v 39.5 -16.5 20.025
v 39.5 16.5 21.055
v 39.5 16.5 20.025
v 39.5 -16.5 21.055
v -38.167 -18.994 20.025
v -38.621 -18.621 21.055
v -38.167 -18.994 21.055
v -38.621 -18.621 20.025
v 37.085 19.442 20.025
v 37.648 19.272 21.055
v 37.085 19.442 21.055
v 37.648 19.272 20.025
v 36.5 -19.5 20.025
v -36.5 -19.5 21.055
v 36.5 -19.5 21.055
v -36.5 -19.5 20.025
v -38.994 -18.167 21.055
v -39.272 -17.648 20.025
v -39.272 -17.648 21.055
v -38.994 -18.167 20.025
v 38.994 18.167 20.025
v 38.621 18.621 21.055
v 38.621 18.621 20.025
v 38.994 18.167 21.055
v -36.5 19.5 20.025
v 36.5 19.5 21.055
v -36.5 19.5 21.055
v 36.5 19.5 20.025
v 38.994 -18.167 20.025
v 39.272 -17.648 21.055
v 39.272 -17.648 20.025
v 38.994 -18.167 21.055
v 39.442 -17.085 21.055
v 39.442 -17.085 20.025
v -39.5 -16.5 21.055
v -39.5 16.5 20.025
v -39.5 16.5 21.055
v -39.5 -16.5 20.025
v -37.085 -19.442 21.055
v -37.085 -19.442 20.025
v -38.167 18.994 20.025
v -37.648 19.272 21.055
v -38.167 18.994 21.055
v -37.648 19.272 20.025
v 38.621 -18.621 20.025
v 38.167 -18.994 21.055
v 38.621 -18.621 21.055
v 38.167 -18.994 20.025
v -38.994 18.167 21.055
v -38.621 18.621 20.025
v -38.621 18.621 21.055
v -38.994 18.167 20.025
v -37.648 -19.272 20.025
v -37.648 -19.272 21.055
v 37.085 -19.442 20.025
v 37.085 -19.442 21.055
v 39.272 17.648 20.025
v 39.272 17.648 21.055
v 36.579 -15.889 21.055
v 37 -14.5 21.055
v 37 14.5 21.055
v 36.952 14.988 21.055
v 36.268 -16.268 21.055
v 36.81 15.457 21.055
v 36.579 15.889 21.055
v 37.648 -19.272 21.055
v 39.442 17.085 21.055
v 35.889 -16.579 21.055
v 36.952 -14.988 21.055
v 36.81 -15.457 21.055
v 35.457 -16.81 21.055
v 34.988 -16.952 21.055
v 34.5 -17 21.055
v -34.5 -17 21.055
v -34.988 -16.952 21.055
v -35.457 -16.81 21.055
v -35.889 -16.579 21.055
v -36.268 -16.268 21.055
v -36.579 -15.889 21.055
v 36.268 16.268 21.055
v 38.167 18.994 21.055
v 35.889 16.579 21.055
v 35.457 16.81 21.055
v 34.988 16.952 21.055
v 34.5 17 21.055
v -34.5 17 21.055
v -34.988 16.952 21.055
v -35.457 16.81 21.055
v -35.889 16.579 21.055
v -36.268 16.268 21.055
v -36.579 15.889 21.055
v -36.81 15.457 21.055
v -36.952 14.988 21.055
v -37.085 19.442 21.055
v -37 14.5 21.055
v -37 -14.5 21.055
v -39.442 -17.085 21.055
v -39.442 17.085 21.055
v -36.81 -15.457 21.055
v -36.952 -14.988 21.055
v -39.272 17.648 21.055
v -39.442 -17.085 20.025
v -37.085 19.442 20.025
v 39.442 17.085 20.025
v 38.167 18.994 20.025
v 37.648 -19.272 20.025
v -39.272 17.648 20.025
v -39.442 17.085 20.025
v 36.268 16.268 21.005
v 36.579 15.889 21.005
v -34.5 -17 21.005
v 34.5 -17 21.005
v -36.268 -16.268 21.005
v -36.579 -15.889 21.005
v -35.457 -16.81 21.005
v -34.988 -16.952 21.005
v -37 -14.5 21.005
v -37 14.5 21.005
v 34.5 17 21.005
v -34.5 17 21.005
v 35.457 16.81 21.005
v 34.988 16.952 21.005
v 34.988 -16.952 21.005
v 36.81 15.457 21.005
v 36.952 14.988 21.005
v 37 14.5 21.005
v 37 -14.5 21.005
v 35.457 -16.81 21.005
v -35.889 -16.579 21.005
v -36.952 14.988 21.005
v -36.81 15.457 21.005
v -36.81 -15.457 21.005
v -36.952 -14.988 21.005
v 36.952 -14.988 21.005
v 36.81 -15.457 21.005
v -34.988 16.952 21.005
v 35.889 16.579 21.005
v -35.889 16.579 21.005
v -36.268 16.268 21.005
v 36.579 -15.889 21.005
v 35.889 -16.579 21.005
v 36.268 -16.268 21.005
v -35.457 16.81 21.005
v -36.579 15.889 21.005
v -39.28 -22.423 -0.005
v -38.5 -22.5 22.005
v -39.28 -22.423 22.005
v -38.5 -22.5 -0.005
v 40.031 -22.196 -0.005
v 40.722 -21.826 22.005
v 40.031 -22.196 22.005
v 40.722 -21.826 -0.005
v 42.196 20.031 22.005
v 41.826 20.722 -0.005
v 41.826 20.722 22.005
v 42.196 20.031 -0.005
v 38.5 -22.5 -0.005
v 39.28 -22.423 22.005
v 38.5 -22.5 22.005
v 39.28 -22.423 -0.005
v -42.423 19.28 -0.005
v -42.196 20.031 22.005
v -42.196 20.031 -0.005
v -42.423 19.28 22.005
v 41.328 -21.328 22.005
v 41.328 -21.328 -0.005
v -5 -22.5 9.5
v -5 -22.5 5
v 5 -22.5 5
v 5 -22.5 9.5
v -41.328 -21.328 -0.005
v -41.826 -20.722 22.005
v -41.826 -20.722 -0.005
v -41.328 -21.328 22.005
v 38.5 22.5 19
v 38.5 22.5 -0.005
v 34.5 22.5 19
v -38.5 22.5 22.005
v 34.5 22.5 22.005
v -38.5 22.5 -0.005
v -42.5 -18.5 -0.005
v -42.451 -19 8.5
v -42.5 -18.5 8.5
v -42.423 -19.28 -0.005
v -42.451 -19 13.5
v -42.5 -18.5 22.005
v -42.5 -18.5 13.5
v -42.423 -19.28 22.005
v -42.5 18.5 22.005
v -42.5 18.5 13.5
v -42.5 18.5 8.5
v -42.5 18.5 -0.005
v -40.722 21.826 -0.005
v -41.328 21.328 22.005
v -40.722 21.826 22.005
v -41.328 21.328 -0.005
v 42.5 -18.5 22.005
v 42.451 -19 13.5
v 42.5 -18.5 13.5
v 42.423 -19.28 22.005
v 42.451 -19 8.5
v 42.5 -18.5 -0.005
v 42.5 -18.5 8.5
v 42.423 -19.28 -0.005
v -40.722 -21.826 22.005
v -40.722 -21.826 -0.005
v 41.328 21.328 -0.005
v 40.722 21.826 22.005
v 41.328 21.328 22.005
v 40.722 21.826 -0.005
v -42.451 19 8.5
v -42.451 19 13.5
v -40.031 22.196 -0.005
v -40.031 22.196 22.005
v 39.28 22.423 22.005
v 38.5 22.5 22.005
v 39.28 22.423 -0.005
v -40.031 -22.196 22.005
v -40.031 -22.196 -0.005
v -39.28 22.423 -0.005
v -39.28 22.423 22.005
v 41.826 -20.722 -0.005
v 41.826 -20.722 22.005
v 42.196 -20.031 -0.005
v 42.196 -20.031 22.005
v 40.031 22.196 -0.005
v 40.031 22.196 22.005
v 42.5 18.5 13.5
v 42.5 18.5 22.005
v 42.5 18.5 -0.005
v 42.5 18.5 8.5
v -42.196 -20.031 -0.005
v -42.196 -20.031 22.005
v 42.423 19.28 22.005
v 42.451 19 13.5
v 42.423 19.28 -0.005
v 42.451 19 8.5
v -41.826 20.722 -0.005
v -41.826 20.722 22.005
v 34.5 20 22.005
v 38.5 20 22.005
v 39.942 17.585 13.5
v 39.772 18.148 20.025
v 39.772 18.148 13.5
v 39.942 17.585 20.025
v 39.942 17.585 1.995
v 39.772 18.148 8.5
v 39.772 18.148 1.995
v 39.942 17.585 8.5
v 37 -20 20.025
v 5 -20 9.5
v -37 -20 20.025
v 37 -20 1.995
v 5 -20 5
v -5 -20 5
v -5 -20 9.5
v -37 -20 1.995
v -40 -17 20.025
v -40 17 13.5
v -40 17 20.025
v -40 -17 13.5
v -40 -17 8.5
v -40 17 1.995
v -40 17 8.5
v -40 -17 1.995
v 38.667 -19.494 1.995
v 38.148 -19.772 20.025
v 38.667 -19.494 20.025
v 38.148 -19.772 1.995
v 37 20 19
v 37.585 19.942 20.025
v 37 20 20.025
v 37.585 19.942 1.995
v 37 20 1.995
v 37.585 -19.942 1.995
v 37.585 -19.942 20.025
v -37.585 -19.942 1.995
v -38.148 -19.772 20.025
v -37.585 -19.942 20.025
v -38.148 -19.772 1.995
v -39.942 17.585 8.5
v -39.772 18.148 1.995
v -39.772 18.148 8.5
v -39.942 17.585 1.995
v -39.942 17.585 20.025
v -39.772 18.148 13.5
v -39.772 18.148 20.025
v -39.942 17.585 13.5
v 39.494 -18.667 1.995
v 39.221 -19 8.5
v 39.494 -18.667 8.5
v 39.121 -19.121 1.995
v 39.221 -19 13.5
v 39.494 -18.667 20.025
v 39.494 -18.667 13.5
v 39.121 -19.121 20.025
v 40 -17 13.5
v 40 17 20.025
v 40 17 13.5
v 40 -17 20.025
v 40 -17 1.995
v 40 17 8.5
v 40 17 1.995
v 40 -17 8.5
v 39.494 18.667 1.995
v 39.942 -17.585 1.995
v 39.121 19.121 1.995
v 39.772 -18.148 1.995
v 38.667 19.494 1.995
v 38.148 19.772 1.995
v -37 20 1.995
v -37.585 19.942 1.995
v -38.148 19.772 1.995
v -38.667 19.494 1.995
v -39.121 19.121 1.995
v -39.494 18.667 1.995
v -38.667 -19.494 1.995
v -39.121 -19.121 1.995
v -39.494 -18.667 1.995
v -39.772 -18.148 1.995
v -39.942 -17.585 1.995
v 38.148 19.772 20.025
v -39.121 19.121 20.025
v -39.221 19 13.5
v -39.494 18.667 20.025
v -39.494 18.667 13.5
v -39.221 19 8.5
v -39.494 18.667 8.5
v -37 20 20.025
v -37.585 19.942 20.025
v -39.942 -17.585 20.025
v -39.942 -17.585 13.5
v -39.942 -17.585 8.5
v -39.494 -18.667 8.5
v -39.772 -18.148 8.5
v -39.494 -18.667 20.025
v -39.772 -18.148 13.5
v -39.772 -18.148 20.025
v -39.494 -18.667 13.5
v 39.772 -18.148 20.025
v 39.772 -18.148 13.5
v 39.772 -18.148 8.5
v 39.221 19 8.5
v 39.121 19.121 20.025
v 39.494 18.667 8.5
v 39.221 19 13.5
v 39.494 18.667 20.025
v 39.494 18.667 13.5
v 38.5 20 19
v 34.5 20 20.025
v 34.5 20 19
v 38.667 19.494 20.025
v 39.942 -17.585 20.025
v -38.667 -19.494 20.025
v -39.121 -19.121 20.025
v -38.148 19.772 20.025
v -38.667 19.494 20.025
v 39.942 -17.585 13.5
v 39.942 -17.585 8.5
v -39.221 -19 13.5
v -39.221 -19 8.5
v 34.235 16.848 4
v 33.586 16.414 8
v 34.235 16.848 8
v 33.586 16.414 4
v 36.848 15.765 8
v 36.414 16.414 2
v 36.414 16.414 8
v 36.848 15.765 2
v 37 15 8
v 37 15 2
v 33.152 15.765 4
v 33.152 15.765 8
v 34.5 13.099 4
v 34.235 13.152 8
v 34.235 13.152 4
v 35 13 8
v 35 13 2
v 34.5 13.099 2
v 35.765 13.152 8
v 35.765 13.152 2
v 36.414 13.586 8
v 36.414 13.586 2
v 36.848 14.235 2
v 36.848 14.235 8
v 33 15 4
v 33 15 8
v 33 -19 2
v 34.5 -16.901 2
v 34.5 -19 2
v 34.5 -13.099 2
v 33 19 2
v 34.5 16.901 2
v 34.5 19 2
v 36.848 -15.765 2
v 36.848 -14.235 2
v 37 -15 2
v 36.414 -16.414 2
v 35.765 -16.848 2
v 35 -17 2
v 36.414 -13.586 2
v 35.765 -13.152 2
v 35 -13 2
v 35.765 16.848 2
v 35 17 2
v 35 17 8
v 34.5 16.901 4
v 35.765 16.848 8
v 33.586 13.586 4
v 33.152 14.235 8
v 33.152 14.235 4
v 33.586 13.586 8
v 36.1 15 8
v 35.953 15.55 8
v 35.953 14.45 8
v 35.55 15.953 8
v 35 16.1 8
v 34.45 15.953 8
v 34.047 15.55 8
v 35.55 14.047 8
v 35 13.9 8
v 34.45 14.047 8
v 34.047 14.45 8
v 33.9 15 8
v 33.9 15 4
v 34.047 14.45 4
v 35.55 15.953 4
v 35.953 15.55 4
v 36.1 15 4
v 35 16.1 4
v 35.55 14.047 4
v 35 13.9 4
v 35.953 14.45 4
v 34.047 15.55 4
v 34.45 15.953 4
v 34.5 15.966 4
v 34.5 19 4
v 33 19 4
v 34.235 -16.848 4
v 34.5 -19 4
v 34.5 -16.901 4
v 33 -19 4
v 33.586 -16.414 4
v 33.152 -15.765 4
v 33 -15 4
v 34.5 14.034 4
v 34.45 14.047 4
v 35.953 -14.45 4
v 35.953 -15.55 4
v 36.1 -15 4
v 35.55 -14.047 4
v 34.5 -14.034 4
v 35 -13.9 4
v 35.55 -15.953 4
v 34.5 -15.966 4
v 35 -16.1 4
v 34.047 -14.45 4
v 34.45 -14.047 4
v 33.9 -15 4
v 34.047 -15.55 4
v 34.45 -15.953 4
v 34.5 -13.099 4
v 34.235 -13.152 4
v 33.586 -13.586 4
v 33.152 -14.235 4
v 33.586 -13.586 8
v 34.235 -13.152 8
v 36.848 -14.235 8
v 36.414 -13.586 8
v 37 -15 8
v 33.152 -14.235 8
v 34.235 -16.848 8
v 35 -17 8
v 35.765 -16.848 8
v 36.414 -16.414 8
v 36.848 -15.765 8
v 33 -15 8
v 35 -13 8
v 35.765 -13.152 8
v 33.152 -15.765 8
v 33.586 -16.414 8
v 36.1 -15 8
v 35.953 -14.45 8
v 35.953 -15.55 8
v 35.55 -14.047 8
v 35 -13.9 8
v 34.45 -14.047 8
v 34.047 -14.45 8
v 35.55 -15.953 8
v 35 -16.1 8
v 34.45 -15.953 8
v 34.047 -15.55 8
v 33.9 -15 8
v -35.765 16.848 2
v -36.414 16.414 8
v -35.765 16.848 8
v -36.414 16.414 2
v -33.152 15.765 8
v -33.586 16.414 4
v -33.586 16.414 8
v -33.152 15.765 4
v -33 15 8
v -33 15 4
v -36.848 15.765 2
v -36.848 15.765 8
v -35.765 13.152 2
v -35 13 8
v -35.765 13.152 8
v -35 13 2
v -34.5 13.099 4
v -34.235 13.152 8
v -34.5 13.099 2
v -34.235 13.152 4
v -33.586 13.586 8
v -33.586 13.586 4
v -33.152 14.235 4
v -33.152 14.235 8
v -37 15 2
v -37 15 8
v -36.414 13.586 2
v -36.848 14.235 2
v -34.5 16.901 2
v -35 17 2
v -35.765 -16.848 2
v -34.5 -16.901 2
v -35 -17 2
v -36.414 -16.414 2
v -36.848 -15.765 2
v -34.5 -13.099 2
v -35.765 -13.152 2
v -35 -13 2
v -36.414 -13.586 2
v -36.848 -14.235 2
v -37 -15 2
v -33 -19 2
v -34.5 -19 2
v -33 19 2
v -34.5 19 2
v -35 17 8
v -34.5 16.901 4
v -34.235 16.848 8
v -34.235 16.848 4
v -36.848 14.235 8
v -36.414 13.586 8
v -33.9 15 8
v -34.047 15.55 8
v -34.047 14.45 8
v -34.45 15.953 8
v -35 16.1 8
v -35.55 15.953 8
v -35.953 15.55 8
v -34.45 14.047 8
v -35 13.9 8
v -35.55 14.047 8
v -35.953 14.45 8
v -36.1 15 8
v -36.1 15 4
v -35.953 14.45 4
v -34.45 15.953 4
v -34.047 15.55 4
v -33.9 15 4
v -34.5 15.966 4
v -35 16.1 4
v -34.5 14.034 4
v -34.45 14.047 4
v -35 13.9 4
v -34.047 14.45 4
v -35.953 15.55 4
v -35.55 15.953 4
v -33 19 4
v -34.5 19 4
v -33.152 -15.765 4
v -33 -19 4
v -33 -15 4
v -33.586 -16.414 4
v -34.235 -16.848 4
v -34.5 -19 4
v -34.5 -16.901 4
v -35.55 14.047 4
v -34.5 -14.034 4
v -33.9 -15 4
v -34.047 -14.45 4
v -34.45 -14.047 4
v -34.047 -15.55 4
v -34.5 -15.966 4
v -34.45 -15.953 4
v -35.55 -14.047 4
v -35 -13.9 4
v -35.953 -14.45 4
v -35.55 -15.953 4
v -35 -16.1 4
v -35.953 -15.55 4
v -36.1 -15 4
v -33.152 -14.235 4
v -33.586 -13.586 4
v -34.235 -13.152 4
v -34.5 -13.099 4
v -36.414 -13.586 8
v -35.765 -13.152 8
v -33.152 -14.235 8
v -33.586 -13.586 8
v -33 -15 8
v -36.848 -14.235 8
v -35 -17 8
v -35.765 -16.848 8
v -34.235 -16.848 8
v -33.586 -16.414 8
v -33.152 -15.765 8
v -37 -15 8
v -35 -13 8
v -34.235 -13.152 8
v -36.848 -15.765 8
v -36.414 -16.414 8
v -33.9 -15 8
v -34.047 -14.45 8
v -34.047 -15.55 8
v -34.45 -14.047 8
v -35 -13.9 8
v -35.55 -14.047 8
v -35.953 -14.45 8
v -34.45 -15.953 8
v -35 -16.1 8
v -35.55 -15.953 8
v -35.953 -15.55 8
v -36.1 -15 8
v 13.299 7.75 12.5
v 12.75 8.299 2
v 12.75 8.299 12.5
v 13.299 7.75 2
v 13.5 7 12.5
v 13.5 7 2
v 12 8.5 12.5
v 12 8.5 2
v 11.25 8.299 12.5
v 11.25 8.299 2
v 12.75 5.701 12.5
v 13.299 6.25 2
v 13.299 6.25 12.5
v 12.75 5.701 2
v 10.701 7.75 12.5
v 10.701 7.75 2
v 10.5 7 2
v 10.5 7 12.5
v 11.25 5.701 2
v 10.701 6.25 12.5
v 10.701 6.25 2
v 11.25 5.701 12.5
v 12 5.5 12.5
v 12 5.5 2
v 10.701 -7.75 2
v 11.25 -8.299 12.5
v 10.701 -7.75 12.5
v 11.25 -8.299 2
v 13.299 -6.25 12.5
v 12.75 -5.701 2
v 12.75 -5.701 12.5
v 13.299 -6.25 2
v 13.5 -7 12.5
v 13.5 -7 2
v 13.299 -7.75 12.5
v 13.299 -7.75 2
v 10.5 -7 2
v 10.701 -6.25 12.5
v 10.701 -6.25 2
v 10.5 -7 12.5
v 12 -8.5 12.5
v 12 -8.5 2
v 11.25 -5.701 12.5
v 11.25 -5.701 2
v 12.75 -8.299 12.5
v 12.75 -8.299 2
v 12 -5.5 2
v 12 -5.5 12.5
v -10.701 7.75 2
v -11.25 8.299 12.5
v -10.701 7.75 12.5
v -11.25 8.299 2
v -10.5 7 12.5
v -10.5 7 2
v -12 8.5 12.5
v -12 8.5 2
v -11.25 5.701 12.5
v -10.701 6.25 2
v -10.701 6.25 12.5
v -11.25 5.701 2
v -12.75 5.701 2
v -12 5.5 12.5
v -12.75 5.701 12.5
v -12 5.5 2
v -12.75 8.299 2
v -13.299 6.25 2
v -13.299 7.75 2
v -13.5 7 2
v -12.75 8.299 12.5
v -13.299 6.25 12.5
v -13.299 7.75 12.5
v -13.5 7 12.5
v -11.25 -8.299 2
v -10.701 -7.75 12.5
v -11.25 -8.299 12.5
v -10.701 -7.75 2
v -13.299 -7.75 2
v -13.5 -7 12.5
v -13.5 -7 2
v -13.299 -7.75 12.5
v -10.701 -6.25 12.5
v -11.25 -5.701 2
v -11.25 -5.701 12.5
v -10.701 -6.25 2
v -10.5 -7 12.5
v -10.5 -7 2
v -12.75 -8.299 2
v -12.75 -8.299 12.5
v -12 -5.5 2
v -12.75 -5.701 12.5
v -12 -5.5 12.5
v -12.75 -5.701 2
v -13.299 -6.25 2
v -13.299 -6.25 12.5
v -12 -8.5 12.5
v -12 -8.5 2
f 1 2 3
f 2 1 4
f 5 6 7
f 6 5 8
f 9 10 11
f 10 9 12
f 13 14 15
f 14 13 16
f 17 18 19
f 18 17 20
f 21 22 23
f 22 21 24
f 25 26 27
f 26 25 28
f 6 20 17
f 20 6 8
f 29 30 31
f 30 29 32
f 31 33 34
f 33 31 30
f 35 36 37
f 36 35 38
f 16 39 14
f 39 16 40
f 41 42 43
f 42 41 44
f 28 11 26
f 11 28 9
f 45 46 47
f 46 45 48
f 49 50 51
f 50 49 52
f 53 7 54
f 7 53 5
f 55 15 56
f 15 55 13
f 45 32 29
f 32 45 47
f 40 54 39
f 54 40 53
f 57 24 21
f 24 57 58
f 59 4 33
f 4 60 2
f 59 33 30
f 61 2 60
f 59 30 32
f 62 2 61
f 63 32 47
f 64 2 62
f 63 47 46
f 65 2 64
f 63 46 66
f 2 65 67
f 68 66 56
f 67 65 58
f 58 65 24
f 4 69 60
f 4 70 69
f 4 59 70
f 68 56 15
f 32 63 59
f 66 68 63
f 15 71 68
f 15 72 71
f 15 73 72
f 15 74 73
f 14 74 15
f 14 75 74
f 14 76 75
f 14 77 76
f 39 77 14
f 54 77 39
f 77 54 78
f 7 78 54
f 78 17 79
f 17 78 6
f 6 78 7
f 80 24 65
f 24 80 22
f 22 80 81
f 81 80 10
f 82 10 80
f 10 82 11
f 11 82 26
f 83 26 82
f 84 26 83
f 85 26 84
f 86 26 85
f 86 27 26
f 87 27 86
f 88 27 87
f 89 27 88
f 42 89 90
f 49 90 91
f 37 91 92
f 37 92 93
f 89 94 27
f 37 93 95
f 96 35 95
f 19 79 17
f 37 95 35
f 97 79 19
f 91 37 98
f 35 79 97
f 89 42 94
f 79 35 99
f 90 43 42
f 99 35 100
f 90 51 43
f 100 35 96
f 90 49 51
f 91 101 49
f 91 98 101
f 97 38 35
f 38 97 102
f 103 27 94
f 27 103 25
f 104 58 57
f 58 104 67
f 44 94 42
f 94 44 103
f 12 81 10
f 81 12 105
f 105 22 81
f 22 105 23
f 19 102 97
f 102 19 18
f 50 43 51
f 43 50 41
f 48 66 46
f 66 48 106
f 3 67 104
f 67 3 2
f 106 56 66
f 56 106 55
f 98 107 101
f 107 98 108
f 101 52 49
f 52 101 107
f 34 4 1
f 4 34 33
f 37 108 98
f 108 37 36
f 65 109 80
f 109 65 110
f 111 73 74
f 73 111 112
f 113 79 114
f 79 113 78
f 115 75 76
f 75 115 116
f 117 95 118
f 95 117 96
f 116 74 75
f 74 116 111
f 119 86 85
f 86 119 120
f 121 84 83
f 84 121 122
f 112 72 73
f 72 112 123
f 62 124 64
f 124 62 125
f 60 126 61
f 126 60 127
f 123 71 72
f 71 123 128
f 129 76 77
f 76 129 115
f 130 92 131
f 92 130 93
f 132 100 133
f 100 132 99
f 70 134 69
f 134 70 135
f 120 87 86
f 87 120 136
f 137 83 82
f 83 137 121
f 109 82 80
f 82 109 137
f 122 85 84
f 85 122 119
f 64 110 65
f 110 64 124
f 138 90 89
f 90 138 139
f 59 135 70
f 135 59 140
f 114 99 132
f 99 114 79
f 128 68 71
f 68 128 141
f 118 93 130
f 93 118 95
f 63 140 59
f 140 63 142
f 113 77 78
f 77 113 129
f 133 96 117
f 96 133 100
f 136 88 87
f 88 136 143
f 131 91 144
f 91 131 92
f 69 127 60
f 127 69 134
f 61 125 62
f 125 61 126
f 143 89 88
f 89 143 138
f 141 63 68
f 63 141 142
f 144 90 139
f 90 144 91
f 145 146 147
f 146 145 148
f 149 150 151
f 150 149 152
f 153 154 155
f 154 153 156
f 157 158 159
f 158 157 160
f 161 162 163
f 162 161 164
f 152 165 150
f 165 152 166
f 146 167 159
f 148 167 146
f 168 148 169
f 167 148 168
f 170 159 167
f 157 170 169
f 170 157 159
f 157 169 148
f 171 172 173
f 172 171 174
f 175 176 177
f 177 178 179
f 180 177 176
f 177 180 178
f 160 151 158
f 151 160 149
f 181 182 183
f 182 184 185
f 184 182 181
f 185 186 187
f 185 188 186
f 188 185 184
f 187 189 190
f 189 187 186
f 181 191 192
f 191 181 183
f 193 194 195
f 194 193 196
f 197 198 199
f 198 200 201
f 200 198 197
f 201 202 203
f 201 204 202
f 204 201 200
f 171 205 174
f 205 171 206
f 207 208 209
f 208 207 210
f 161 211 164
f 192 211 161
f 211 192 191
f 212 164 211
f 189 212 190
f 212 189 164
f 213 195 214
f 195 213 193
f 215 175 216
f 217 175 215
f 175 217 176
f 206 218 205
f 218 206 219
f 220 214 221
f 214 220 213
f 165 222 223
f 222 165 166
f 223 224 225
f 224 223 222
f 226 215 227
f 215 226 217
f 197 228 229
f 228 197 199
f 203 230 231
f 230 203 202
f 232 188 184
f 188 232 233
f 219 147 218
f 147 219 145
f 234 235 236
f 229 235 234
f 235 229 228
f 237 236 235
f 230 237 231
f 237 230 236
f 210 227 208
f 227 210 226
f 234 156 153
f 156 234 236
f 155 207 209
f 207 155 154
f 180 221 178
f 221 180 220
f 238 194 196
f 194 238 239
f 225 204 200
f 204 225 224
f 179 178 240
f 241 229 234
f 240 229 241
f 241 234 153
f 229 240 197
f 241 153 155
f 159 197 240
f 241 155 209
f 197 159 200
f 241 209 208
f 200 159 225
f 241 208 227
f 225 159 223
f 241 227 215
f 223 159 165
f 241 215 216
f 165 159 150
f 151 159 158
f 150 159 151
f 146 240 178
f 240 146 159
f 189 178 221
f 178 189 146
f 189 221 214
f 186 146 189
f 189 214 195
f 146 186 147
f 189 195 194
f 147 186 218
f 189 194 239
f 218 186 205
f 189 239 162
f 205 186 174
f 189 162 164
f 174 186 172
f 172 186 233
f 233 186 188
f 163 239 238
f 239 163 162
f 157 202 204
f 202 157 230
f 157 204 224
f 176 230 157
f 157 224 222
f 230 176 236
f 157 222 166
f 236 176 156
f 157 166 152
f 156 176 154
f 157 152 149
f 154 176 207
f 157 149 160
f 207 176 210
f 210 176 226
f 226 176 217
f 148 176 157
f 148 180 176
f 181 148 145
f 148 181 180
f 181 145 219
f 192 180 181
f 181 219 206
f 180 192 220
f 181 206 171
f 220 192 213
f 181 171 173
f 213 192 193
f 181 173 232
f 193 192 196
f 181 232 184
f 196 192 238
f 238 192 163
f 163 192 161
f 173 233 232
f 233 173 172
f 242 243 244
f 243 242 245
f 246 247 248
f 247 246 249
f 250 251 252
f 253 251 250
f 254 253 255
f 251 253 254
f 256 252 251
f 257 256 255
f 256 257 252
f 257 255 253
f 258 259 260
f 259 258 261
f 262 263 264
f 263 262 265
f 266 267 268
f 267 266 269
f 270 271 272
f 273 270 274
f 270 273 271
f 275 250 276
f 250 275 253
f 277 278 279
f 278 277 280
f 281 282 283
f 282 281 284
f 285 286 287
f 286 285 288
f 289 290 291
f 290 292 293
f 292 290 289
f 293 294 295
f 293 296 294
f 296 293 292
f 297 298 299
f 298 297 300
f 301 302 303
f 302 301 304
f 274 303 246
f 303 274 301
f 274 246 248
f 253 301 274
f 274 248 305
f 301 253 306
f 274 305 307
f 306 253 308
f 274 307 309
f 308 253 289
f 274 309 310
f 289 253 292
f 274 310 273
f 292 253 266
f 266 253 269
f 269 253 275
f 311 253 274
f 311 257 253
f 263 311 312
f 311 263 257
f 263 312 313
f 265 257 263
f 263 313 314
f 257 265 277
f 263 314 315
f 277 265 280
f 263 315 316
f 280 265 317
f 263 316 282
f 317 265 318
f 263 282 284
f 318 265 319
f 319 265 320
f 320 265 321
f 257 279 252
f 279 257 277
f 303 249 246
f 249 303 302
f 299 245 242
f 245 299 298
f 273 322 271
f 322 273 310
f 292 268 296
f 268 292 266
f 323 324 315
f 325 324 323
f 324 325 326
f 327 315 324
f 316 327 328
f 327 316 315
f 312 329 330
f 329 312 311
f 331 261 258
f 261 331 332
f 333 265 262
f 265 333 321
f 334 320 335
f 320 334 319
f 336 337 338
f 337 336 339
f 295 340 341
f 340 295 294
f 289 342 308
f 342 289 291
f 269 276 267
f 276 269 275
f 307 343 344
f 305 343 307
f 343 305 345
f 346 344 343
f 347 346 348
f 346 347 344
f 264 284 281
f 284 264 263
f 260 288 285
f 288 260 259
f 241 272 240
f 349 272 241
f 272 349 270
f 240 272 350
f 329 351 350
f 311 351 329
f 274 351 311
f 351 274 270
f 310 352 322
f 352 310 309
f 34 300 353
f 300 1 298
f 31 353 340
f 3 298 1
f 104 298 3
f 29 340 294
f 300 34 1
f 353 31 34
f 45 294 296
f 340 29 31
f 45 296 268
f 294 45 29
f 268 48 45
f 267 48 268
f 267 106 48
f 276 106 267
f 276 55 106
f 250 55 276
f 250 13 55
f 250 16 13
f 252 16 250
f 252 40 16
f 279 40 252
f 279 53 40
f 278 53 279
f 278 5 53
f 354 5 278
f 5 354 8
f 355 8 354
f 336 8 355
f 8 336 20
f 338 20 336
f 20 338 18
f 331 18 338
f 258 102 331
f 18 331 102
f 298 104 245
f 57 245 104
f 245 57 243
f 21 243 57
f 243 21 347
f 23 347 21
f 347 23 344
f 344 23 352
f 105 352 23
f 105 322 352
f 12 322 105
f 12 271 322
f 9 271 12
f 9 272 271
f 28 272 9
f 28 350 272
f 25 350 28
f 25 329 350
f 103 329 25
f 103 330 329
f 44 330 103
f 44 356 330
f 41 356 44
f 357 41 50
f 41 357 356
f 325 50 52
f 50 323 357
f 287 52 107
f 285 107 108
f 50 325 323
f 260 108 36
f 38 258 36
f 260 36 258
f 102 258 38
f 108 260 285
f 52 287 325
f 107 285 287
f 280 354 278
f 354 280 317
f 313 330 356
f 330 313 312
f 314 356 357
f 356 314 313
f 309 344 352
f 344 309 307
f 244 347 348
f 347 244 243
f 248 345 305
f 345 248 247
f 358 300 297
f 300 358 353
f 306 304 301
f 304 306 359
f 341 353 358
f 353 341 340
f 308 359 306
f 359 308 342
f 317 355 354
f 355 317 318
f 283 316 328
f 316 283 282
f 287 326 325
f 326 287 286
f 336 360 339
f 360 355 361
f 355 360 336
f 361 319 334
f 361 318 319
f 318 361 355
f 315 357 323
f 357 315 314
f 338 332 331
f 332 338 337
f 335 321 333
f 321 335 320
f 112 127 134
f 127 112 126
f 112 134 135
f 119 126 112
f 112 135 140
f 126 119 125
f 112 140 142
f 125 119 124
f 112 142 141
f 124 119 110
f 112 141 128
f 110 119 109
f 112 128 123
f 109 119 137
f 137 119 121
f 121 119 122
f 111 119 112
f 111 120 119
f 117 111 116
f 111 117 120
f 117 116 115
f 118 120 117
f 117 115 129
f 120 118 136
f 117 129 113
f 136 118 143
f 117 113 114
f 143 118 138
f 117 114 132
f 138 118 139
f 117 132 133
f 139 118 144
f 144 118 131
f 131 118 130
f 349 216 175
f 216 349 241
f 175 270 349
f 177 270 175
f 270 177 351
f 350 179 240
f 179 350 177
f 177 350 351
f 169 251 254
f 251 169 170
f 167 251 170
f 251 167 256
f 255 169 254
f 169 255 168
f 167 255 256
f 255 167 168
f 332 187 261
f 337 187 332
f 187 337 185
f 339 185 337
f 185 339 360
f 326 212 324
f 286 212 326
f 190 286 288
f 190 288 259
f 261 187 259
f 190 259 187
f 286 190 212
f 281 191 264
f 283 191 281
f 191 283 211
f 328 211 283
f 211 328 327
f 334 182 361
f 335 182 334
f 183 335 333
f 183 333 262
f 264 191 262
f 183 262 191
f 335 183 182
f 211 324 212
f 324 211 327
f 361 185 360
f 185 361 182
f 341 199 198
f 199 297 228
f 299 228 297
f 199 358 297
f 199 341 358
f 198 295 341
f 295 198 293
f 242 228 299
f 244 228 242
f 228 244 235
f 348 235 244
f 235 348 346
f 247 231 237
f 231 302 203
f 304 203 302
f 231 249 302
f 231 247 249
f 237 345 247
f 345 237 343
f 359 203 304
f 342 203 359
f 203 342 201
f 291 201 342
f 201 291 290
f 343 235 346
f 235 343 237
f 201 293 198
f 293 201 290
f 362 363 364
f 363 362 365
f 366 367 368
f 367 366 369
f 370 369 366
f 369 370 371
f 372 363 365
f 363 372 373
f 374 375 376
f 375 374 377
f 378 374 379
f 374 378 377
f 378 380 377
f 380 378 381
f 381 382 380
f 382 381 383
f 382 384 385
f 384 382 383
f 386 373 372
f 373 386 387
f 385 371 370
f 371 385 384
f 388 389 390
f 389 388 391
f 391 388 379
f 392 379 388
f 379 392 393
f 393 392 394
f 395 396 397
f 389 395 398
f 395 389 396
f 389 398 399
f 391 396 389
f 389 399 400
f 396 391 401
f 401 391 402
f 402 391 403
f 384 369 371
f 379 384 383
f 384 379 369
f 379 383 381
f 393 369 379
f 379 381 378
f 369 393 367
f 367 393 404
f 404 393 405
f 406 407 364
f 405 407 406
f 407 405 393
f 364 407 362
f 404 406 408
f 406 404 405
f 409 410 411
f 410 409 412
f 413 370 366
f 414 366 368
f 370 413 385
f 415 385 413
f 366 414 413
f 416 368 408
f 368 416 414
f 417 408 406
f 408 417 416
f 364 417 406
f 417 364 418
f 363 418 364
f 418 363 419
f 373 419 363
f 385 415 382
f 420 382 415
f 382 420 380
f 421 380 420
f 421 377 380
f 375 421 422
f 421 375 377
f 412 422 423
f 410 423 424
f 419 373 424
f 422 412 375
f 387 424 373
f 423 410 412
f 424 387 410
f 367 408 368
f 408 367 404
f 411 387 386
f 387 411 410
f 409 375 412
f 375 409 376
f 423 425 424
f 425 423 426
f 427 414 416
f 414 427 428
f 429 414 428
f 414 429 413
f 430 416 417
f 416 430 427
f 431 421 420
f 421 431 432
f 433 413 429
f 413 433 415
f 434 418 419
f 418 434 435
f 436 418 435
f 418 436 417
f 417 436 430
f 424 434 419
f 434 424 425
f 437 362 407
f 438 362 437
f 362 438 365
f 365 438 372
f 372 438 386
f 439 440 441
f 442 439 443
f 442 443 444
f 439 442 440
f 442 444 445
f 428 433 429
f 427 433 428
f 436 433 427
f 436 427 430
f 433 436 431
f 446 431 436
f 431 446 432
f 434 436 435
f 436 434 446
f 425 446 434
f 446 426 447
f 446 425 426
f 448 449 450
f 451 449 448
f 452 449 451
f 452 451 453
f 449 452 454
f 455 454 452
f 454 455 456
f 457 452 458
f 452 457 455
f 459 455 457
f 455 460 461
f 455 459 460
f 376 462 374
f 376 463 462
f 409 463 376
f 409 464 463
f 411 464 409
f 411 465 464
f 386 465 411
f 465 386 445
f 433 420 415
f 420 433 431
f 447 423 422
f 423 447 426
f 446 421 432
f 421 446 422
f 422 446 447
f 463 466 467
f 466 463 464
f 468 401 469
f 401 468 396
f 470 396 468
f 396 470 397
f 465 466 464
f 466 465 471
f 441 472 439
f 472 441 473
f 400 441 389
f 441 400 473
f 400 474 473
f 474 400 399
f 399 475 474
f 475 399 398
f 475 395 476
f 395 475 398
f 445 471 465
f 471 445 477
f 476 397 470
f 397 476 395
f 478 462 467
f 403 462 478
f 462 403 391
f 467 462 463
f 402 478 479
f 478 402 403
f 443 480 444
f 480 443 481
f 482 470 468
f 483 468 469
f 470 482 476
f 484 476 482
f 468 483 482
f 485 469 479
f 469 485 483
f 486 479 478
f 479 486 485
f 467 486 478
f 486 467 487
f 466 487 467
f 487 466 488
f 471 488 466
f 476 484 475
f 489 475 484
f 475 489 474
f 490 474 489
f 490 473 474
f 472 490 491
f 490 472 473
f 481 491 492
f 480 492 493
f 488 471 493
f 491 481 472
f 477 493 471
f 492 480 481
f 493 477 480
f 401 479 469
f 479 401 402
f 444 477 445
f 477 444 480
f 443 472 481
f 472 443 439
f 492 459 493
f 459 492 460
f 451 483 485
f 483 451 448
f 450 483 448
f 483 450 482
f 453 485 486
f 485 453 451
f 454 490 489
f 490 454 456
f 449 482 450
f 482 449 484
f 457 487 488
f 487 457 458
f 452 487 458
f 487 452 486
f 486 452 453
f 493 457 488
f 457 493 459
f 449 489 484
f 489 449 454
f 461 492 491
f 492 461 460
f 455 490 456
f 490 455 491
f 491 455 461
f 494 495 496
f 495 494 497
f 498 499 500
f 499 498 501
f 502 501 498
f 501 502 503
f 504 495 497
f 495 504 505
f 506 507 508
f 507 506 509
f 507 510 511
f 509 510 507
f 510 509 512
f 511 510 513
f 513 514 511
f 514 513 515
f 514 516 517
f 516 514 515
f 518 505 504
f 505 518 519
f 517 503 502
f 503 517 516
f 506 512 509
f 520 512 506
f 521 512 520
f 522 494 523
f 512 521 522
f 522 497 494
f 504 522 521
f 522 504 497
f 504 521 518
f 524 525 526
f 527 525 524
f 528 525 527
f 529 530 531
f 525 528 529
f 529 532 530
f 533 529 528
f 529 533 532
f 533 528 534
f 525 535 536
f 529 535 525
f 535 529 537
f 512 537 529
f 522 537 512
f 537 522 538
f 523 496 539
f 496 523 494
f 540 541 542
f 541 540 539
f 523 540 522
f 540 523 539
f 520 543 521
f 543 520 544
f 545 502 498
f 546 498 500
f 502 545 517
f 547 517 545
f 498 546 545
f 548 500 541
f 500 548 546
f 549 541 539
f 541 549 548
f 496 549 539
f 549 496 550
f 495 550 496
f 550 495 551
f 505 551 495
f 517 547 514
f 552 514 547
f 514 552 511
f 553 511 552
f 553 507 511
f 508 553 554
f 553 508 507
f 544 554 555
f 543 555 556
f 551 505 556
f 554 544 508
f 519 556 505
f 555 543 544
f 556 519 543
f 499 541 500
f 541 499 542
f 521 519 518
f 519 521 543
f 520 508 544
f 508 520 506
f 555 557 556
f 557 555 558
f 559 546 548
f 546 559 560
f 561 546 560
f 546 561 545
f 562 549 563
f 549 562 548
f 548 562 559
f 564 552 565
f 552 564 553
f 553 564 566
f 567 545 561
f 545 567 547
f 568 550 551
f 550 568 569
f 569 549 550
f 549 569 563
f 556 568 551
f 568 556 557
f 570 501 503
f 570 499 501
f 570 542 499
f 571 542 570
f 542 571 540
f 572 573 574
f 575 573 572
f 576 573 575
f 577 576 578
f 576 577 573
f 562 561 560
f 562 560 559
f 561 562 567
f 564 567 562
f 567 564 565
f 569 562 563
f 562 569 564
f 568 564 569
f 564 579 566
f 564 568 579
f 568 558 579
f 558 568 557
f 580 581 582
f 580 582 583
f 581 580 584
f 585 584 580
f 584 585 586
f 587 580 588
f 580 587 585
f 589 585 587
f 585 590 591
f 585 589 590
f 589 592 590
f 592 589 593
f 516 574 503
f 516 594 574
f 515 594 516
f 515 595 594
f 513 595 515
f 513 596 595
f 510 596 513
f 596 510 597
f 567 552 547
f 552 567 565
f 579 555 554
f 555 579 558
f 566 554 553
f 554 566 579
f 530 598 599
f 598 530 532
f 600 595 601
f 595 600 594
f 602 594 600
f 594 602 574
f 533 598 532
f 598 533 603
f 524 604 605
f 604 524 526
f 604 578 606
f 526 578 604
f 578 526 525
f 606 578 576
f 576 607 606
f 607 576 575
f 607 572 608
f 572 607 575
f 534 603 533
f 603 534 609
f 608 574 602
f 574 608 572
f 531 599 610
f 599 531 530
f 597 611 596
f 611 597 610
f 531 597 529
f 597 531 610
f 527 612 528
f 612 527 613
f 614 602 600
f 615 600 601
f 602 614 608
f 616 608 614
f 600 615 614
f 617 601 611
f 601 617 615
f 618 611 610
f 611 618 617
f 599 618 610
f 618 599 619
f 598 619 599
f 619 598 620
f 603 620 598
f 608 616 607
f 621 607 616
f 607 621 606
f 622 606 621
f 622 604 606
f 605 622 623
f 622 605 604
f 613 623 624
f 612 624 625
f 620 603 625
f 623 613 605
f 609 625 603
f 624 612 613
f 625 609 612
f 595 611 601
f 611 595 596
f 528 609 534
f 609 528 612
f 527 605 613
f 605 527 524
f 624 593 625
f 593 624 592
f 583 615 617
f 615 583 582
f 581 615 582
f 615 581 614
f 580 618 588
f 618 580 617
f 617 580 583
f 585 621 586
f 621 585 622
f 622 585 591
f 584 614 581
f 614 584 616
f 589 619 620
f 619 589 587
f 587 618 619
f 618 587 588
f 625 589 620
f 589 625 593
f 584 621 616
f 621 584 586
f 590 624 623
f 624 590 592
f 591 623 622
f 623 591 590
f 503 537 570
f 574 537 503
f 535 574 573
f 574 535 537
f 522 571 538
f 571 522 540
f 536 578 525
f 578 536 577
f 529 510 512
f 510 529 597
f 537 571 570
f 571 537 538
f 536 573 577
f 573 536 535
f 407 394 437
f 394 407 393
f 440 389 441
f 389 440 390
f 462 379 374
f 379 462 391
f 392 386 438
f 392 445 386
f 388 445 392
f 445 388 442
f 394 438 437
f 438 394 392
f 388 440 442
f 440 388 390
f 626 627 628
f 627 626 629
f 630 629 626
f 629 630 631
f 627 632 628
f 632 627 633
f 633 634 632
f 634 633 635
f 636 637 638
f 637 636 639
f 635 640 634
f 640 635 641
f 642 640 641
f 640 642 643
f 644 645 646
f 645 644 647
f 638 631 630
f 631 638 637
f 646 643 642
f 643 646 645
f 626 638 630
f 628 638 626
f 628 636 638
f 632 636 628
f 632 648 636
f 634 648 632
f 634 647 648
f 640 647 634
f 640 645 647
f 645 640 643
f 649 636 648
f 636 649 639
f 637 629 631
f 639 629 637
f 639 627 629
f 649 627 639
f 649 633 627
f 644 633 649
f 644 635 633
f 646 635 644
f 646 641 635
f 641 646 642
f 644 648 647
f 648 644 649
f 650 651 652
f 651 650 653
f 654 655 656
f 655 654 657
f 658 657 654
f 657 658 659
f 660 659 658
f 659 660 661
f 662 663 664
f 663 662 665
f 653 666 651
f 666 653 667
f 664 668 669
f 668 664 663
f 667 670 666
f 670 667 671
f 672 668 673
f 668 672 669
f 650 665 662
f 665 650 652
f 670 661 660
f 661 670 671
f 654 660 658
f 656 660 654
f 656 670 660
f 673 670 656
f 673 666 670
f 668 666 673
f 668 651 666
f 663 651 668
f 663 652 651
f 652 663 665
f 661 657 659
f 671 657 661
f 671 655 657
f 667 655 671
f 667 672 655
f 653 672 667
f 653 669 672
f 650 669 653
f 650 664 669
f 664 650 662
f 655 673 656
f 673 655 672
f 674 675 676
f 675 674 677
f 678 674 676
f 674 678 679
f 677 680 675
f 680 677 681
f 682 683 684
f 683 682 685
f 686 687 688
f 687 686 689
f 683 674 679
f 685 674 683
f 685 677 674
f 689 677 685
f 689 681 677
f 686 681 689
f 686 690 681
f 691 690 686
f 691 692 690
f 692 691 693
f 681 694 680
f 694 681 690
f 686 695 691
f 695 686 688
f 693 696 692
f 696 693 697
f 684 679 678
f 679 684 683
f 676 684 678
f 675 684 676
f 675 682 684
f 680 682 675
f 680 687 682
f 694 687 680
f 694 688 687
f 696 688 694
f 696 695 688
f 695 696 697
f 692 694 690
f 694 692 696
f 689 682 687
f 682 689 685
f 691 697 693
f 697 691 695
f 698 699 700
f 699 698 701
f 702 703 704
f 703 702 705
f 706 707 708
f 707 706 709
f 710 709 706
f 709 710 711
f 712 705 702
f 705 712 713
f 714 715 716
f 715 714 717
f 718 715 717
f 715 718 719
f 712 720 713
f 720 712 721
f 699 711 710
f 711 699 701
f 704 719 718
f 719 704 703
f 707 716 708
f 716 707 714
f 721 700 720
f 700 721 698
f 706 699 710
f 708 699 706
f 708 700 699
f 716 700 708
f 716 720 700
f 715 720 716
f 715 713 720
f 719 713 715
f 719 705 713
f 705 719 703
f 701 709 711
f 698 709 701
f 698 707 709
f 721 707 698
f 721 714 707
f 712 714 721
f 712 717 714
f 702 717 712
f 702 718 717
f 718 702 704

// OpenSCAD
/*
 * SkyHerd Cattle Collar -- Electronics Shell (OpenSCAD)
 *
 * Parametric PETG shell for RAK3172 + MAX-M10S GPS + MPU-6050 + 2500mAh LiPo.
 * IP65 rating achieved via 2mm silicone gasket groove around lid perimeter.
 *
 * Regenerate STL:
 *   openscad collar_shell.scad -o collar_shell.stl
 *   (or: make -C hardware/collar shell)
 *
 * Print settings:
 *   Material:     PETG (UV + moisture resistant; preferred over PLA)
 *   Layer height: 0.2 mm
 *   Walls:        3 perimeters
 *   Infill:       30% gyroid
 *   Supports:     Only for strap slots (tree supports)
 *   Temperature:  240C nozzle / 80C bed
 */

// ---------------------------------------------------------------------------
// Parameters -- adjust to fit your exact PCB stack
// ---------------------------------------------------------------------------

/* [Shell Dimensions] */
shell_length  = 85;   // mm -- long axis (along neck strap direction)
shell_width   = 45;   // mm -- across strap
shell_height  = 22;   // mm -- total external height

wall_t        = 2.5;  // mm -- wall thickness
lid_t         = 2.0;  // mm -- lid thickness
floor_t       = 2.0;  // mm -- floor thickness

/* [Battery Bay] */
bat_l         = 68;   // mm -- battery length
bat_w         = 38;   // mm -- battery width
bat_h         = 9;    // mm -- battery thickness

/* [PCB Stack] */
pcb_l         = 30;   // mm -- RAK3172 module length
pcb_w         = 20;   // mm -- RAK3172 module width
pcb_h         = 5;    // mm -- stack height (module + headers)
pcb_z_offset  = bat_h + 1.5; // above battery bay floor

/* [Antenna Slot] */
ant_slot_w    = 4;    // mm -- IPEX coax width
ant_slot_h    = 3;    // mm -- height of slot in top wall
ant_pos_x     = shell_length / 2 - 8; // position from centre

/* [Gasket Groove] */
gasket_depth  = 2.0;  // mm
gasket_width  = 2.5;  // mm
gasket_offset = 3.0;  // mm from outer edge

/* [Strap Slots] */
strap_w       = 38;   // mm -- 1.5" strap width (imperial)
strap_h       = 5;    // mm -- slot height (fits folded strap)
strap_x_inner = 8;    // mm -- inset from each end

/* [Lid Screw Posts] */
screw_d       = 4.0;  // mm -- M2 screw boss OD
screw_post_h  = 6.0;  // mm
screw_inset   = 5.0;  // mm from corners

/* [USB-C Charging Port] */
usbc_w        = 10.0; // mm -- cutout width
usbc_h        = 4.5;  // mm -- cutout height

// ---------------------------------------------------------------------------
// Derived constants
// ---------------------------------------------------------------------------

inner_l = shell_length - 2 * wall_t;
inner_w = shell_width  - 2 * wall_t;
inner_h = shell_height - floor_t - lid_t;

// ---------------------------------------------------------------------------
// Modules
// ---------------------------------------------------------------------------

module rounded_box(l, w, h, r=3) {
    // Rounded-corner box, centred on XY, z from 0..h
    minkowski() {
        cube([l - 2*r, w - 2*r, h], center=true);
        cylinder(r=r, h=0.01, center=true, $fn=32);
    }
}

module shell_body() {
    difference() {
        // Outer shell
        translate([0, 0, shell_height/2])
            rounded_box(shell_length, shell_width, shell_height, r=4);

        // Inner cavity
        translate([0, 0, floor_t + inner_h/2 + 0.01])
            rounded_box(inner_l, inner_w, inner_h + 0.02, r=3);

        // Lid seat (step for lid to rest on)
        translate([0, 0, shell_height - lid_t - 0.5])
            rounded_box(inner_l - 1, inner_w - 1, lid_t + 1, r=3);

        // Gasket groove in top rim
        translate([0, 0, shell_height - gasket_depth])
            difference() {
                rounded_box(shell_length - 2*gasket_offset,
                            shell_width  - 2*gasket_offset,
                            gasket_depth + 0.1, r=3);
                rounded_box(shell_length - 2*(gasket_offset + gasket_width),
                            shell_width  - 2*(gasket_offset + gasket_width),
                            gasket_depth + 0.2, r=2.5);
            }

        // Antenna slot through top wall (for IPEX coax)
        translate([ant_pos_x, shell_width/2 - wall_t, shell_height - ant_slot_h])
            cube([ant_slot_w, wall_t + 0.2, ant_slot_h + 0.1]);

        // USB-C charging port cutout in front wall
        translate([-usbc_w/2, -shell_width/2 - 0.1, floor_t + 3])
            cube([usbc_w, wall_t + 0.2, usbc_h]);

        // Strap slots -- left end
        translate([-shell_length/2 - 0.1,
                   -strap_w/2,
                   floor_t + inner_h/2 - strap_h/2])
            cube([wall_t + 0.2 + strap_x_inner, strap_w, strap_h]);

        // Strap slots -- right end
        translate([shell_length/2 - strap_x_inner - 0.1,
                   -strap_w/2,
                   floor_t + inner_h/2 - strap_h/2])
            cube([strap_x_inner + wall_t + 0.2, strap_w, strap_h]);
    }
}

module screw_boss(h) {
    // Solid cylindrical boss for M2 screw, hollow top
    difference() {
        cylinder(d=screw_d, h=h, $fn=16);
        translate([0, 0, h - 4])
            cylinder(d=2.2, h=4.1, $fn=12); // M2 pilot hole
    }
}

module screw_bosses() {
    inset = screw_inset;
    x1 =  inner_l/2 - inset;
    x2 = -inner_l/2 + inset;
    y1 =  inner_w/2 - inset;
    y2 = -inner_w/2 + inset;

    for (pos = [[x1,y1], [x1,y2], [x2,y1], [x2,y2]]) {
        translate([pos[0], pos[1], floor_t])
            screw_boss(screw_post_h);
    }
}

module battery_retainer() {
    // Low-profile ledge to keep LiPo from shifting
    translate([-bat_l/2 - 0.5, -bat_w/2, floor_t])
        cube([1.5, bat_w, 2]);
    translate([ bat_l/2 - 1.0, -bat_w/2, floor_t])
        cube([1.5, bat_w, 2]);
}

module pcb_standoffs() {
    // 2mm standoffs for PCB mounting (drill M2 holes in PCB corners)
    so_h = pcb_z_offset;
    for (pos = [[pcb_l/2 - 3, pcb_w/2 - 3],
                [pcb_l/2 - 3, -(pcb_w/2 - 3)],
                [-(pcb_l/2 - 3), pcb_w/2 - 3],
                [-(pcb_l/2 - 3), -(pcb_w/2 - 3)]]) {
        translate([pos[0], pos[1], floor_t])
            cylinder(d=3, h=so_h, $fn=12);
    }
}

// ---------------------------------------------------------------------------
// Main assembly -- body (bottom half)
// ---------------------------------------------------------------------------
module main_body() {
    union() {
        shell_body();
        screw_bosses();
        battery_retainer();
        pcb_standoffs();
    }
}

// ---------------------------------------------------------------------------
// Lid (top half -- print separately, sealed with gasket)
// ---------------------------------------------------------------------------
module lid() {
    translate([0, 0, shell_height + 5]) // offset for preview separation
    difference() {
        rounded_box(shell_length, shell_width, lid_t + 0.5, r=4);

        // M2 screw pass-through holes
        inset = screw_inset;
        x1 =  inner_l/2 - inset;
        x2 = -inner_l/2 + inset;
        y1 =  inner_w/2 - inset;
        y2 = -inner_w/2 + inset;
        for (pos = [[x1,y1], [x1,y2], [x2,y1], [x2,y2]]) {
            translate([pos[0], pos[1], -0.1])
                cylinder(d=2.4, h=lid_t + 0.7, $fn=12);
        }
    }
}

// ---------------------------------------------------------------------------
// Render -- set to "body" or "lid" via command line:
//   openscad -D 'part="lid"' collar_shell.scad -o collar_lid.stl
// ---------------------------------------------------------------------------
part = "body"; // default

if (part == "lid") {
    lid();
} else if (part == "both") {
    main_body();
    lid();
} else {
    main_body();
}
